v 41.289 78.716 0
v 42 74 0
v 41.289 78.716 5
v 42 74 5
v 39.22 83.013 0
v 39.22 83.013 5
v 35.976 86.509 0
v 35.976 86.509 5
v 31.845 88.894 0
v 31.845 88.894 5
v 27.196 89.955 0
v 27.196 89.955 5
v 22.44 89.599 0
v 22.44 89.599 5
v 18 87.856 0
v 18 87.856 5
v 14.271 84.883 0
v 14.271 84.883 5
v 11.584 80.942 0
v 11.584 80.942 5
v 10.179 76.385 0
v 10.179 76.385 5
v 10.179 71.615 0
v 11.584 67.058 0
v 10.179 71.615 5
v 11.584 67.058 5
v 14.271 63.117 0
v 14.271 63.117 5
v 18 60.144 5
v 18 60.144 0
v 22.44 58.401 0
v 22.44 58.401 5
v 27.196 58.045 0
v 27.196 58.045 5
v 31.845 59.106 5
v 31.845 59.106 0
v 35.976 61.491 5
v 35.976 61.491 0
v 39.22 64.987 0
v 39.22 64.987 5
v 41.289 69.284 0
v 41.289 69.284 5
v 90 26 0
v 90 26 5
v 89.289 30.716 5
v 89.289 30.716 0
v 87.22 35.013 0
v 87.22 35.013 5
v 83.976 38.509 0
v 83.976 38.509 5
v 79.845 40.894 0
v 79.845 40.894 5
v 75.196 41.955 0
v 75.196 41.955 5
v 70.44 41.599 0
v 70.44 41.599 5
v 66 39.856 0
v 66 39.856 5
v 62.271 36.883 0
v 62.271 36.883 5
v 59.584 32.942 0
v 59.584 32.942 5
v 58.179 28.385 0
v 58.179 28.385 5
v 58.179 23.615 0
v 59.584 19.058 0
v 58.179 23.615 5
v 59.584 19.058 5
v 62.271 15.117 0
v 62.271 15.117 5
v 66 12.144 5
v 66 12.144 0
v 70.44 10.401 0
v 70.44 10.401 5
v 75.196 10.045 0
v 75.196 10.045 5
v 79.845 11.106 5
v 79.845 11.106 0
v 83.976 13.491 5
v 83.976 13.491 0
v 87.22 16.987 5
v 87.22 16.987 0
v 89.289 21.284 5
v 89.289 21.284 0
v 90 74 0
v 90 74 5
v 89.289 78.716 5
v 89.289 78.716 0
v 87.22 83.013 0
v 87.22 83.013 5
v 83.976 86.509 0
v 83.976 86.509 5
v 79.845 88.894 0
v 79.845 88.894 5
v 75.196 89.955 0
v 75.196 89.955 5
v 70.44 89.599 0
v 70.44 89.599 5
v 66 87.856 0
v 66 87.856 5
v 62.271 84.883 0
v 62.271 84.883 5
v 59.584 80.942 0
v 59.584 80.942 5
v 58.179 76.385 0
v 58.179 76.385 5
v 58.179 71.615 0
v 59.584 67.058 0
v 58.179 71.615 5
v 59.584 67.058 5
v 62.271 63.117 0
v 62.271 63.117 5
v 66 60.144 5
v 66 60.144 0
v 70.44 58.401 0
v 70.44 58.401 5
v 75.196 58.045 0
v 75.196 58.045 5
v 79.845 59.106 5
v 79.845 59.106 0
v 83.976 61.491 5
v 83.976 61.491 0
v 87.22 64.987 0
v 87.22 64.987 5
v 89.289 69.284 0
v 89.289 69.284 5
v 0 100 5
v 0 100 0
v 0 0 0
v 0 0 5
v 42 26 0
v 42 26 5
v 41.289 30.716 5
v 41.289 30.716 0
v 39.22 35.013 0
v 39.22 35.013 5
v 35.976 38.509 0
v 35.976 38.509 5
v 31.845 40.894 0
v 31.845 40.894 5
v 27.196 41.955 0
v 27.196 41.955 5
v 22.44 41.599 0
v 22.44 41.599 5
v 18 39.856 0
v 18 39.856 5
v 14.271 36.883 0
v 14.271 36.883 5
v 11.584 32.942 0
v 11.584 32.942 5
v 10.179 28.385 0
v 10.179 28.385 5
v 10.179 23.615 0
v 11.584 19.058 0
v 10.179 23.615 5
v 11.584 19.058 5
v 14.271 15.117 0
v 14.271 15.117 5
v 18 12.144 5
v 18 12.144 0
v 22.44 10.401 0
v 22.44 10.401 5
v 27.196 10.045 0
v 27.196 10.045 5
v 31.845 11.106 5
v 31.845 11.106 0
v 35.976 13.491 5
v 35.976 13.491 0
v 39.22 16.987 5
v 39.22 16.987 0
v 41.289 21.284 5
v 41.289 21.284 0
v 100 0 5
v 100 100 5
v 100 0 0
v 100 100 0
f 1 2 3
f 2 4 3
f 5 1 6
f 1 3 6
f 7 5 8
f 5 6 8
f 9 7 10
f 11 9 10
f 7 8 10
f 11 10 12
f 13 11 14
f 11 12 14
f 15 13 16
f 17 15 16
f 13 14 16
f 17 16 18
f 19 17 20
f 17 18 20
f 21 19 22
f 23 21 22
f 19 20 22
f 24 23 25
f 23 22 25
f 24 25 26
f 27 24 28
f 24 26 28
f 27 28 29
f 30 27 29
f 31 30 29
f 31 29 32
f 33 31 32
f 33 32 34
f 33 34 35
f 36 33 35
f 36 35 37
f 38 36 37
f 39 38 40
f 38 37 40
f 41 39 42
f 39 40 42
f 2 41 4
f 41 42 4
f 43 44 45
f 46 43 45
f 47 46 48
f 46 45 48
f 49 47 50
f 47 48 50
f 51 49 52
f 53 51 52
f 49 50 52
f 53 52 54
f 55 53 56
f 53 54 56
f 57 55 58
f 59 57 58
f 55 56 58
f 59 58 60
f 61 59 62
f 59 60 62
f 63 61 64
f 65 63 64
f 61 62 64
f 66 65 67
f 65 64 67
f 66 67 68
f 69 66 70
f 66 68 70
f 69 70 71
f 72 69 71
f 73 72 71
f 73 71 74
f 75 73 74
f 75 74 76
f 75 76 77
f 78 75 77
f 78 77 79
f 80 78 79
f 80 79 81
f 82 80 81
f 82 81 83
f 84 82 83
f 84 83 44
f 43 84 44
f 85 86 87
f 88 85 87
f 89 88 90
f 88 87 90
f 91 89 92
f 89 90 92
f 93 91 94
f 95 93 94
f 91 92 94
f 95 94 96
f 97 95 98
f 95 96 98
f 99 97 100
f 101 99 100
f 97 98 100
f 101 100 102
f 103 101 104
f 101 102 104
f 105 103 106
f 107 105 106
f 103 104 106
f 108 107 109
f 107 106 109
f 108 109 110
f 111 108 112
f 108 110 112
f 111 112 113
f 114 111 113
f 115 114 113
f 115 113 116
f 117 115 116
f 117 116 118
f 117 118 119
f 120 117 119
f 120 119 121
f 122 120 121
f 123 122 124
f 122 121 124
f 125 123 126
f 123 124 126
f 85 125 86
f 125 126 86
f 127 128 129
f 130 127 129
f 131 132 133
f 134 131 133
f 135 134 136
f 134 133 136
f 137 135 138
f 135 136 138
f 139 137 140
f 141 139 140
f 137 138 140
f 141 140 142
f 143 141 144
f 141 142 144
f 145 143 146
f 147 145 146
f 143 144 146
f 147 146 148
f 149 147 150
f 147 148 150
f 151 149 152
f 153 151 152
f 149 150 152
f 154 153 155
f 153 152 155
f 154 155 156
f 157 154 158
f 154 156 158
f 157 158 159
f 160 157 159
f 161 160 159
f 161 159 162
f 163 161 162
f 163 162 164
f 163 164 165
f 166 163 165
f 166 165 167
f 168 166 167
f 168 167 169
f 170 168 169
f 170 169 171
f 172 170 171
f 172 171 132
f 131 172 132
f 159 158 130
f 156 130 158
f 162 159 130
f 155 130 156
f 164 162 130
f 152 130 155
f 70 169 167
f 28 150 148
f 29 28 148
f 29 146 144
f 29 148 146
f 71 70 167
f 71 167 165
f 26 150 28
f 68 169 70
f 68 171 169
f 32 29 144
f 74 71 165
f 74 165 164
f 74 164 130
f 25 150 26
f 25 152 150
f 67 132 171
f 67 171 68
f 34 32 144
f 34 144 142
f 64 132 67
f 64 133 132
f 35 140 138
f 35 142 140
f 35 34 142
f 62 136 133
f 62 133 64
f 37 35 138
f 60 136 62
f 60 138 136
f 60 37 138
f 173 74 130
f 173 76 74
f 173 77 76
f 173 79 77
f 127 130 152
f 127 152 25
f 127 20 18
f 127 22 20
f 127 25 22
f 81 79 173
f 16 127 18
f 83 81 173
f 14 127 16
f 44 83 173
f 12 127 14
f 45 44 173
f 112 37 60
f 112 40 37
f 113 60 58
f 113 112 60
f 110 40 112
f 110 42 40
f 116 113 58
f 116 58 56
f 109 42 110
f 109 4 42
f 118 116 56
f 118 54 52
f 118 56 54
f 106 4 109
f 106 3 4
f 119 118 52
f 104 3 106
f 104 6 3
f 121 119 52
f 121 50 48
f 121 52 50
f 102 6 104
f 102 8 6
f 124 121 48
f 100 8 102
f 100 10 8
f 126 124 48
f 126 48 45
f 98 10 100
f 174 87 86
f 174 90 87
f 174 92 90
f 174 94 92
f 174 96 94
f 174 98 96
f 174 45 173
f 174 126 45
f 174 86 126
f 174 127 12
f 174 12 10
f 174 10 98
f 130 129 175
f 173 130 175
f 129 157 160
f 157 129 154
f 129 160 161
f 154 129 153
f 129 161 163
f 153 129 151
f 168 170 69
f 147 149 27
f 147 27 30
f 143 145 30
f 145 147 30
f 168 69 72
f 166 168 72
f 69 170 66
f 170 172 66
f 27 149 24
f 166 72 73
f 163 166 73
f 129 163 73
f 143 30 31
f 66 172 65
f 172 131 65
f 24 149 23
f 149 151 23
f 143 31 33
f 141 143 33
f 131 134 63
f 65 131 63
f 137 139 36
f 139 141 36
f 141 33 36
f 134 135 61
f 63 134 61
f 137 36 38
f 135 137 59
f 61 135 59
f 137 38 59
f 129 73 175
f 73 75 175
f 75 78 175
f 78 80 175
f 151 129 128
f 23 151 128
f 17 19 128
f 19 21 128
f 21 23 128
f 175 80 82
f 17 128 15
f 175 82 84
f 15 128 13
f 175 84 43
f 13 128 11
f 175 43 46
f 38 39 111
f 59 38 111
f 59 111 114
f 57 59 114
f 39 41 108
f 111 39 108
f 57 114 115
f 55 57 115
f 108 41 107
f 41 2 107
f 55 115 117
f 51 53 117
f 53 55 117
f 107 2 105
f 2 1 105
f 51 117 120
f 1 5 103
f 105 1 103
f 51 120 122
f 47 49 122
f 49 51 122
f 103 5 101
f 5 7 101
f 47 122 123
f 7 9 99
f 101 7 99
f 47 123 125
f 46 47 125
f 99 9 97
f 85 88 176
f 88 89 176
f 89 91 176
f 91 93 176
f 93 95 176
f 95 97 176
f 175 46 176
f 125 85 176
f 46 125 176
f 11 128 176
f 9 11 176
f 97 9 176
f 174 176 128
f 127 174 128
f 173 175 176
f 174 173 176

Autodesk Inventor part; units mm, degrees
ref_plane "YZ Plane" through (0, 0, 0) normal (1, 0, 0) x (0, 1, 0)
ref_plane "XZ Plane" through (0, 0, 0) normal (0, 1, 0) x (-1, 0, 0)
ref_plane "XY Plane" through (0, 0, 0) normal (0, 0, 1) x (1, 0, 0)
sketch "Sketch1" plane through (0, 0, 0) normal (0, 0, 1) x (1, 0, 0)
  line L0 (0, 0) -> (100, 0)
  line L1 (100, 0) -> (100, 100)
  line L2 (100, 100) -> (0, 100)
  line L3 (0, 100) -> (0, 0)
  dimension "d0" = 100
  dimension "d1" = 100
extrude "Extrusion1" add sketch "Sketch1" along normal blind 5
sketch "Sketch2" plane through (0, 0, 5) normal (0, 0, 1) x (1, 0, 0)
  line L0 (100, 100) -> (0, 100) construction
  line L1 (0, 0) -> (100, 0) construction
  line L2 (100, 0) -> (100, 100) construction
  line L3 (0, 100) -> (0, 0) construction
  circle A0 centre (26, 74) radius 16
  circle A1 centre (74, 26) radius 16
  circle A2 centre (74, 74) radius 16
  circle A3 centre (26, 26) radius 16
  dimension "d4" = 32
  dimension "d5" = 32
  dimension "d6" = 32
  dimension "d7" = 32
  dimension "d15" = 26
  dimension "d16" = 26
  dimension "d17" = 26
  dimension "d18" = 26
  dimension "d19" = 26
  dimension "d20" = 26
  dimension "d21" = 26
  dimension "d22" = 26
  dimension "d23" = 48
  dimension "d24" = 48
  dimension "d25" = 48
  dimension "d26" = 48
extrude "Extrusion3" cut sketch "Sketch2" against normal blind 5
equation "\"d0\" = tankw"
equation "\"d1\" = sensorsupportl"
equation "\"d2\" = pvct"
equation "\"d4\" = diahcl"
equation "\"d5\" = diaph"
equation "\"d6\" = diacucl"
equation "\"d7\" = diaetape"
equation "\"d15\" = 0.5 * diahcl + 2 * pvct"
equation "\"d16\" = 0.5 * diahcl + 2 * pvct"
equation "\"d17\" = 0.5 * diacucl + 2 * pvct"
equation "\"d18\" = 0.5 * diacucl + 2 * pvct"
equation "\"d19\" = 0.5 * diaph + 2 * pvct"
equation "\"d20\" = 0.5 * diaph + 2 * pvct"
equation "\"d21\" = 0.5 * diaetape + 2 * pvct"
equation "\"d22\" = 0.5 * diaetape + 2 * pvct"
equation "\"d29\" = pvct"
equation "\"lcsd\" = 19.05"
equation "\"lcwd1\" = 25"
equation "\"lcwd2\" = 34"
equation "\"lch1\" = 39"
equation "\"lcwd3\" = 43"
equation "\"dia1\" = 6"
equation "\"td\" = 18"
equation "\"bhh\" = 6"
equation "\"sw\" = 25"
equation "\"sh\" = 31"
equation "\"spacert\" = 2"
equation "\"pvct\" = 5"
equation "\"tankw\" = 100"
equation "\"tankl\" = 379"
equation "\"dia3\" = 8"
equation "\"dia4\" = 11"
equation "\"play\" = 9"
equation "\"holeh\" = 26"
equation "\"surroundt\" = 5"
equation "\"slack\" = 0.5"
equation "\"play2\" = 3"
equation "\"diaoverflow\" = 25"
equation "\"diacucl\" = 32"
equation "\"diawater\" = 25"
equation "\"diaph\" = 32"
equation "\"diaair\" = 32"
equation "\"diasurroundhole\" = 42"
equation "\"sensorsupportl\" = 100"
equation "\"diagrate\" = 12"
equation "\"gratespacing\" = 12.02082"
equation "\"sidedist\" = 13.9375"
equation "\"bottomdist\" = 9.6355"
equation "\"diahcl\" = 32"
equation "\"bracketwtop\" = 6"
equation "\"bracketwbottom\" = 6"
equation "\"nett\" = 1"
equation "\"nethole\" = 16"
equation "\"netside\" = 3.5"
equation "\"nettop\" = 7"
equation "\"netholespacing\" = 2"
equation "\"diaetape\" = 32"
properties part number "tank_front" material "PVC-Piping"
